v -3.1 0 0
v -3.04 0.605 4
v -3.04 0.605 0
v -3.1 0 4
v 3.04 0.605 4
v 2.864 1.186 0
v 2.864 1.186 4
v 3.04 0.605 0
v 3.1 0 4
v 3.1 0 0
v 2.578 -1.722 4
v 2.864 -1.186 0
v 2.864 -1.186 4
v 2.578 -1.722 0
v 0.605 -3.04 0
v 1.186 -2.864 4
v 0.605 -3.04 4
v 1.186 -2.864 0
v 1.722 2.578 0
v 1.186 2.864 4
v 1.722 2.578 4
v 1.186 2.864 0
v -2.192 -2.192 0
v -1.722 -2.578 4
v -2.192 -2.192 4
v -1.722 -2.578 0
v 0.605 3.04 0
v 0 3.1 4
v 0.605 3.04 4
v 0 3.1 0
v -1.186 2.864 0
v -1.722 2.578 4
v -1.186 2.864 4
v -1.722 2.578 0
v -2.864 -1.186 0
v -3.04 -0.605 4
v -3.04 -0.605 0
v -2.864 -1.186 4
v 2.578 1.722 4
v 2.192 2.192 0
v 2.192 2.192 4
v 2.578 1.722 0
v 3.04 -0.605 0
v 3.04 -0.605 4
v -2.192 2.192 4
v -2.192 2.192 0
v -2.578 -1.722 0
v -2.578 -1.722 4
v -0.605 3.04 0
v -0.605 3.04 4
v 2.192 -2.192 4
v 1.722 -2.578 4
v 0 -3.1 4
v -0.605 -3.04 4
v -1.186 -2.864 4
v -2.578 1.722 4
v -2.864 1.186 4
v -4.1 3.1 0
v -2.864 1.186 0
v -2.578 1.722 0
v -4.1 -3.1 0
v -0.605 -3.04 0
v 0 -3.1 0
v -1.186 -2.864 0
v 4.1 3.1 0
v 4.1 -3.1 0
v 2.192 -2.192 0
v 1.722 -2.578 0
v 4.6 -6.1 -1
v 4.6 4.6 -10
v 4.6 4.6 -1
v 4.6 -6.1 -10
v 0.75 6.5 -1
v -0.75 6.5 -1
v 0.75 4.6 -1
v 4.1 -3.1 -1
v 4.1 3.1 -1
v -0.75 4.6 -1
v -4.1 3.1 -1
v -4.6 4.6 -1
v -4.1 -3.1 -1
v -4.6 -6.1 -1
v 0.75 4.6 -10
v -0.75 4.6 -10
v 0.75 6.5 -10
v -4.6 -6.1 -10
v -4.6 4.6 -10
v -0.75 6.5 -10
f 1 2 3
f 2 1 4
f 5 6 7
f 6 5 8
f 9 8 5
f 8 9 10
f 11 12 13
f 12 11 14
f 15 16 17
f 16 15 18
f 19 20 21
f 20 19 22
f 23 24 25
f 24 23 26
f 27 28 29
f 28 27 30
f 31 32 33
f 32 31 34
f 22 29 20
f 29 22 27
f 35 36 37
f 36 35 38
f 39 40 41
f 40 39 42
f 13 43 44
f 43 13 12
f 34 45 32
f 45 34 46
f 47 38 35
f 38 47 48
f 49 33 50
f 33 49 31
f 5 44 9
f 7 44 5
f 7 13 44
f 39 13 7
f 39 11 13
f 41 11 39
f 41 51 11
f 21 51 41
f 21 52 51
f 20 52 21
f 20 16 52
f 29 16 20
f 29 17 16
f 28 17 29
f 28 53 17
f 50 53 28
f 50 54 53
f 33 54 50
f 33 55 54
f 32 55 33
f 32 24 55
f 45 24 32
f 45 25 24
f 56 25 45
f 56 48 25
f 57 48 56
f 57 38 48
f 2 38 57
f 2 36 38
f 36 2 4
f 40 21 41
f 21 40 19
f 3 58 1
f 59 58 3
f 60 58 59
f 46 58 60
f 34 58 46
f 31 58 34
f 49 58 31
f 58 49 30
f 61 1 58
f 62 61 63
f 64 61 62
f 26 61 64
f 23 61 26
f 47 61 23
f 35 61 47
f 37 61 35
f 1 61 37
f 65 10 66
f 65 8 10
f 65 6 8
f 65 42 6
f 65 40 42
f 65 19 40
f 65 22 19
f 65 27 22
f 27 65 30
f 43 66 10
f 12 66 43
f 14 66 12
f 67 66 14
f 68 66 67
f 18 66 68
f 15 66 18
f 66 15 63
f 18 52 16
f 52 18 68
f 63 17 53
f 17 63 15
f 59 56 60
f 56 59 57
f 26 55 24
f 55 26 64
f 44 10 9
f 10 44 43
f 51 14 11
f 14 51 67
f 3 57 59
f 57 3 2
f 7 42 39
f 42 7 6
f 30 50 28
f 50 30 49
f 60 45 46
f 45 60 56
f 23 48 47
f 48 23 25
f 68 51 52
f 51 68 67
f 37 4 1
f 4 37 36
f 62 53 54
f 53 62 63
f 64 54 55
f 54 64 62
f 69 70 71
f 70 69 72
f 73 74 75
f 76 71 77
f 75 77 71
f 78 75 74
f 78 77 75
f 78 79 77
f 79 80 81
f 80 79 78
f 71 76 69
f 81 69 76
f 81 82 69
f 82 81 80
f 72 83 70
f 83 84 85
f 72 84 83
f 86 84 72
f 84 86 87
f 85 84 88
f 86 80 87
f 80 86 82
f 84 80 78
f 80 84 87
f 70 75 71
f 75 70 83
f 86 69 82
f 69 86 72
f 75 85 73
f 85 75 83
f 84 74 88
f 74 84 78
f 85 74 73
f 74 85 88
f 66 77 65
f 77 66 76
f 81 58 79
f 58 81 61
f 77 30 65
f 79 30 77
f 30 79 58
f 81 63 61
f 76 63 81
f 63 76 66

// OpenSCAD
$fn = $preview ? 20 : 100;

module jack_thonkicon() {
        translate([0,0,0]) cylinder($fn=32,h=4,d=6+0.2);
        translate([0,-0.75,-1-4.5]) cube([9+0.2,10.5+0.2,9],center=true);
        translate([0,4.5,-1-4.5]) cube([1.5,4,9],center=true);
        translate([0,0,-1]) cube([8+0.2,6+0.2,2],center=true);
}

jack_thonkicon();
